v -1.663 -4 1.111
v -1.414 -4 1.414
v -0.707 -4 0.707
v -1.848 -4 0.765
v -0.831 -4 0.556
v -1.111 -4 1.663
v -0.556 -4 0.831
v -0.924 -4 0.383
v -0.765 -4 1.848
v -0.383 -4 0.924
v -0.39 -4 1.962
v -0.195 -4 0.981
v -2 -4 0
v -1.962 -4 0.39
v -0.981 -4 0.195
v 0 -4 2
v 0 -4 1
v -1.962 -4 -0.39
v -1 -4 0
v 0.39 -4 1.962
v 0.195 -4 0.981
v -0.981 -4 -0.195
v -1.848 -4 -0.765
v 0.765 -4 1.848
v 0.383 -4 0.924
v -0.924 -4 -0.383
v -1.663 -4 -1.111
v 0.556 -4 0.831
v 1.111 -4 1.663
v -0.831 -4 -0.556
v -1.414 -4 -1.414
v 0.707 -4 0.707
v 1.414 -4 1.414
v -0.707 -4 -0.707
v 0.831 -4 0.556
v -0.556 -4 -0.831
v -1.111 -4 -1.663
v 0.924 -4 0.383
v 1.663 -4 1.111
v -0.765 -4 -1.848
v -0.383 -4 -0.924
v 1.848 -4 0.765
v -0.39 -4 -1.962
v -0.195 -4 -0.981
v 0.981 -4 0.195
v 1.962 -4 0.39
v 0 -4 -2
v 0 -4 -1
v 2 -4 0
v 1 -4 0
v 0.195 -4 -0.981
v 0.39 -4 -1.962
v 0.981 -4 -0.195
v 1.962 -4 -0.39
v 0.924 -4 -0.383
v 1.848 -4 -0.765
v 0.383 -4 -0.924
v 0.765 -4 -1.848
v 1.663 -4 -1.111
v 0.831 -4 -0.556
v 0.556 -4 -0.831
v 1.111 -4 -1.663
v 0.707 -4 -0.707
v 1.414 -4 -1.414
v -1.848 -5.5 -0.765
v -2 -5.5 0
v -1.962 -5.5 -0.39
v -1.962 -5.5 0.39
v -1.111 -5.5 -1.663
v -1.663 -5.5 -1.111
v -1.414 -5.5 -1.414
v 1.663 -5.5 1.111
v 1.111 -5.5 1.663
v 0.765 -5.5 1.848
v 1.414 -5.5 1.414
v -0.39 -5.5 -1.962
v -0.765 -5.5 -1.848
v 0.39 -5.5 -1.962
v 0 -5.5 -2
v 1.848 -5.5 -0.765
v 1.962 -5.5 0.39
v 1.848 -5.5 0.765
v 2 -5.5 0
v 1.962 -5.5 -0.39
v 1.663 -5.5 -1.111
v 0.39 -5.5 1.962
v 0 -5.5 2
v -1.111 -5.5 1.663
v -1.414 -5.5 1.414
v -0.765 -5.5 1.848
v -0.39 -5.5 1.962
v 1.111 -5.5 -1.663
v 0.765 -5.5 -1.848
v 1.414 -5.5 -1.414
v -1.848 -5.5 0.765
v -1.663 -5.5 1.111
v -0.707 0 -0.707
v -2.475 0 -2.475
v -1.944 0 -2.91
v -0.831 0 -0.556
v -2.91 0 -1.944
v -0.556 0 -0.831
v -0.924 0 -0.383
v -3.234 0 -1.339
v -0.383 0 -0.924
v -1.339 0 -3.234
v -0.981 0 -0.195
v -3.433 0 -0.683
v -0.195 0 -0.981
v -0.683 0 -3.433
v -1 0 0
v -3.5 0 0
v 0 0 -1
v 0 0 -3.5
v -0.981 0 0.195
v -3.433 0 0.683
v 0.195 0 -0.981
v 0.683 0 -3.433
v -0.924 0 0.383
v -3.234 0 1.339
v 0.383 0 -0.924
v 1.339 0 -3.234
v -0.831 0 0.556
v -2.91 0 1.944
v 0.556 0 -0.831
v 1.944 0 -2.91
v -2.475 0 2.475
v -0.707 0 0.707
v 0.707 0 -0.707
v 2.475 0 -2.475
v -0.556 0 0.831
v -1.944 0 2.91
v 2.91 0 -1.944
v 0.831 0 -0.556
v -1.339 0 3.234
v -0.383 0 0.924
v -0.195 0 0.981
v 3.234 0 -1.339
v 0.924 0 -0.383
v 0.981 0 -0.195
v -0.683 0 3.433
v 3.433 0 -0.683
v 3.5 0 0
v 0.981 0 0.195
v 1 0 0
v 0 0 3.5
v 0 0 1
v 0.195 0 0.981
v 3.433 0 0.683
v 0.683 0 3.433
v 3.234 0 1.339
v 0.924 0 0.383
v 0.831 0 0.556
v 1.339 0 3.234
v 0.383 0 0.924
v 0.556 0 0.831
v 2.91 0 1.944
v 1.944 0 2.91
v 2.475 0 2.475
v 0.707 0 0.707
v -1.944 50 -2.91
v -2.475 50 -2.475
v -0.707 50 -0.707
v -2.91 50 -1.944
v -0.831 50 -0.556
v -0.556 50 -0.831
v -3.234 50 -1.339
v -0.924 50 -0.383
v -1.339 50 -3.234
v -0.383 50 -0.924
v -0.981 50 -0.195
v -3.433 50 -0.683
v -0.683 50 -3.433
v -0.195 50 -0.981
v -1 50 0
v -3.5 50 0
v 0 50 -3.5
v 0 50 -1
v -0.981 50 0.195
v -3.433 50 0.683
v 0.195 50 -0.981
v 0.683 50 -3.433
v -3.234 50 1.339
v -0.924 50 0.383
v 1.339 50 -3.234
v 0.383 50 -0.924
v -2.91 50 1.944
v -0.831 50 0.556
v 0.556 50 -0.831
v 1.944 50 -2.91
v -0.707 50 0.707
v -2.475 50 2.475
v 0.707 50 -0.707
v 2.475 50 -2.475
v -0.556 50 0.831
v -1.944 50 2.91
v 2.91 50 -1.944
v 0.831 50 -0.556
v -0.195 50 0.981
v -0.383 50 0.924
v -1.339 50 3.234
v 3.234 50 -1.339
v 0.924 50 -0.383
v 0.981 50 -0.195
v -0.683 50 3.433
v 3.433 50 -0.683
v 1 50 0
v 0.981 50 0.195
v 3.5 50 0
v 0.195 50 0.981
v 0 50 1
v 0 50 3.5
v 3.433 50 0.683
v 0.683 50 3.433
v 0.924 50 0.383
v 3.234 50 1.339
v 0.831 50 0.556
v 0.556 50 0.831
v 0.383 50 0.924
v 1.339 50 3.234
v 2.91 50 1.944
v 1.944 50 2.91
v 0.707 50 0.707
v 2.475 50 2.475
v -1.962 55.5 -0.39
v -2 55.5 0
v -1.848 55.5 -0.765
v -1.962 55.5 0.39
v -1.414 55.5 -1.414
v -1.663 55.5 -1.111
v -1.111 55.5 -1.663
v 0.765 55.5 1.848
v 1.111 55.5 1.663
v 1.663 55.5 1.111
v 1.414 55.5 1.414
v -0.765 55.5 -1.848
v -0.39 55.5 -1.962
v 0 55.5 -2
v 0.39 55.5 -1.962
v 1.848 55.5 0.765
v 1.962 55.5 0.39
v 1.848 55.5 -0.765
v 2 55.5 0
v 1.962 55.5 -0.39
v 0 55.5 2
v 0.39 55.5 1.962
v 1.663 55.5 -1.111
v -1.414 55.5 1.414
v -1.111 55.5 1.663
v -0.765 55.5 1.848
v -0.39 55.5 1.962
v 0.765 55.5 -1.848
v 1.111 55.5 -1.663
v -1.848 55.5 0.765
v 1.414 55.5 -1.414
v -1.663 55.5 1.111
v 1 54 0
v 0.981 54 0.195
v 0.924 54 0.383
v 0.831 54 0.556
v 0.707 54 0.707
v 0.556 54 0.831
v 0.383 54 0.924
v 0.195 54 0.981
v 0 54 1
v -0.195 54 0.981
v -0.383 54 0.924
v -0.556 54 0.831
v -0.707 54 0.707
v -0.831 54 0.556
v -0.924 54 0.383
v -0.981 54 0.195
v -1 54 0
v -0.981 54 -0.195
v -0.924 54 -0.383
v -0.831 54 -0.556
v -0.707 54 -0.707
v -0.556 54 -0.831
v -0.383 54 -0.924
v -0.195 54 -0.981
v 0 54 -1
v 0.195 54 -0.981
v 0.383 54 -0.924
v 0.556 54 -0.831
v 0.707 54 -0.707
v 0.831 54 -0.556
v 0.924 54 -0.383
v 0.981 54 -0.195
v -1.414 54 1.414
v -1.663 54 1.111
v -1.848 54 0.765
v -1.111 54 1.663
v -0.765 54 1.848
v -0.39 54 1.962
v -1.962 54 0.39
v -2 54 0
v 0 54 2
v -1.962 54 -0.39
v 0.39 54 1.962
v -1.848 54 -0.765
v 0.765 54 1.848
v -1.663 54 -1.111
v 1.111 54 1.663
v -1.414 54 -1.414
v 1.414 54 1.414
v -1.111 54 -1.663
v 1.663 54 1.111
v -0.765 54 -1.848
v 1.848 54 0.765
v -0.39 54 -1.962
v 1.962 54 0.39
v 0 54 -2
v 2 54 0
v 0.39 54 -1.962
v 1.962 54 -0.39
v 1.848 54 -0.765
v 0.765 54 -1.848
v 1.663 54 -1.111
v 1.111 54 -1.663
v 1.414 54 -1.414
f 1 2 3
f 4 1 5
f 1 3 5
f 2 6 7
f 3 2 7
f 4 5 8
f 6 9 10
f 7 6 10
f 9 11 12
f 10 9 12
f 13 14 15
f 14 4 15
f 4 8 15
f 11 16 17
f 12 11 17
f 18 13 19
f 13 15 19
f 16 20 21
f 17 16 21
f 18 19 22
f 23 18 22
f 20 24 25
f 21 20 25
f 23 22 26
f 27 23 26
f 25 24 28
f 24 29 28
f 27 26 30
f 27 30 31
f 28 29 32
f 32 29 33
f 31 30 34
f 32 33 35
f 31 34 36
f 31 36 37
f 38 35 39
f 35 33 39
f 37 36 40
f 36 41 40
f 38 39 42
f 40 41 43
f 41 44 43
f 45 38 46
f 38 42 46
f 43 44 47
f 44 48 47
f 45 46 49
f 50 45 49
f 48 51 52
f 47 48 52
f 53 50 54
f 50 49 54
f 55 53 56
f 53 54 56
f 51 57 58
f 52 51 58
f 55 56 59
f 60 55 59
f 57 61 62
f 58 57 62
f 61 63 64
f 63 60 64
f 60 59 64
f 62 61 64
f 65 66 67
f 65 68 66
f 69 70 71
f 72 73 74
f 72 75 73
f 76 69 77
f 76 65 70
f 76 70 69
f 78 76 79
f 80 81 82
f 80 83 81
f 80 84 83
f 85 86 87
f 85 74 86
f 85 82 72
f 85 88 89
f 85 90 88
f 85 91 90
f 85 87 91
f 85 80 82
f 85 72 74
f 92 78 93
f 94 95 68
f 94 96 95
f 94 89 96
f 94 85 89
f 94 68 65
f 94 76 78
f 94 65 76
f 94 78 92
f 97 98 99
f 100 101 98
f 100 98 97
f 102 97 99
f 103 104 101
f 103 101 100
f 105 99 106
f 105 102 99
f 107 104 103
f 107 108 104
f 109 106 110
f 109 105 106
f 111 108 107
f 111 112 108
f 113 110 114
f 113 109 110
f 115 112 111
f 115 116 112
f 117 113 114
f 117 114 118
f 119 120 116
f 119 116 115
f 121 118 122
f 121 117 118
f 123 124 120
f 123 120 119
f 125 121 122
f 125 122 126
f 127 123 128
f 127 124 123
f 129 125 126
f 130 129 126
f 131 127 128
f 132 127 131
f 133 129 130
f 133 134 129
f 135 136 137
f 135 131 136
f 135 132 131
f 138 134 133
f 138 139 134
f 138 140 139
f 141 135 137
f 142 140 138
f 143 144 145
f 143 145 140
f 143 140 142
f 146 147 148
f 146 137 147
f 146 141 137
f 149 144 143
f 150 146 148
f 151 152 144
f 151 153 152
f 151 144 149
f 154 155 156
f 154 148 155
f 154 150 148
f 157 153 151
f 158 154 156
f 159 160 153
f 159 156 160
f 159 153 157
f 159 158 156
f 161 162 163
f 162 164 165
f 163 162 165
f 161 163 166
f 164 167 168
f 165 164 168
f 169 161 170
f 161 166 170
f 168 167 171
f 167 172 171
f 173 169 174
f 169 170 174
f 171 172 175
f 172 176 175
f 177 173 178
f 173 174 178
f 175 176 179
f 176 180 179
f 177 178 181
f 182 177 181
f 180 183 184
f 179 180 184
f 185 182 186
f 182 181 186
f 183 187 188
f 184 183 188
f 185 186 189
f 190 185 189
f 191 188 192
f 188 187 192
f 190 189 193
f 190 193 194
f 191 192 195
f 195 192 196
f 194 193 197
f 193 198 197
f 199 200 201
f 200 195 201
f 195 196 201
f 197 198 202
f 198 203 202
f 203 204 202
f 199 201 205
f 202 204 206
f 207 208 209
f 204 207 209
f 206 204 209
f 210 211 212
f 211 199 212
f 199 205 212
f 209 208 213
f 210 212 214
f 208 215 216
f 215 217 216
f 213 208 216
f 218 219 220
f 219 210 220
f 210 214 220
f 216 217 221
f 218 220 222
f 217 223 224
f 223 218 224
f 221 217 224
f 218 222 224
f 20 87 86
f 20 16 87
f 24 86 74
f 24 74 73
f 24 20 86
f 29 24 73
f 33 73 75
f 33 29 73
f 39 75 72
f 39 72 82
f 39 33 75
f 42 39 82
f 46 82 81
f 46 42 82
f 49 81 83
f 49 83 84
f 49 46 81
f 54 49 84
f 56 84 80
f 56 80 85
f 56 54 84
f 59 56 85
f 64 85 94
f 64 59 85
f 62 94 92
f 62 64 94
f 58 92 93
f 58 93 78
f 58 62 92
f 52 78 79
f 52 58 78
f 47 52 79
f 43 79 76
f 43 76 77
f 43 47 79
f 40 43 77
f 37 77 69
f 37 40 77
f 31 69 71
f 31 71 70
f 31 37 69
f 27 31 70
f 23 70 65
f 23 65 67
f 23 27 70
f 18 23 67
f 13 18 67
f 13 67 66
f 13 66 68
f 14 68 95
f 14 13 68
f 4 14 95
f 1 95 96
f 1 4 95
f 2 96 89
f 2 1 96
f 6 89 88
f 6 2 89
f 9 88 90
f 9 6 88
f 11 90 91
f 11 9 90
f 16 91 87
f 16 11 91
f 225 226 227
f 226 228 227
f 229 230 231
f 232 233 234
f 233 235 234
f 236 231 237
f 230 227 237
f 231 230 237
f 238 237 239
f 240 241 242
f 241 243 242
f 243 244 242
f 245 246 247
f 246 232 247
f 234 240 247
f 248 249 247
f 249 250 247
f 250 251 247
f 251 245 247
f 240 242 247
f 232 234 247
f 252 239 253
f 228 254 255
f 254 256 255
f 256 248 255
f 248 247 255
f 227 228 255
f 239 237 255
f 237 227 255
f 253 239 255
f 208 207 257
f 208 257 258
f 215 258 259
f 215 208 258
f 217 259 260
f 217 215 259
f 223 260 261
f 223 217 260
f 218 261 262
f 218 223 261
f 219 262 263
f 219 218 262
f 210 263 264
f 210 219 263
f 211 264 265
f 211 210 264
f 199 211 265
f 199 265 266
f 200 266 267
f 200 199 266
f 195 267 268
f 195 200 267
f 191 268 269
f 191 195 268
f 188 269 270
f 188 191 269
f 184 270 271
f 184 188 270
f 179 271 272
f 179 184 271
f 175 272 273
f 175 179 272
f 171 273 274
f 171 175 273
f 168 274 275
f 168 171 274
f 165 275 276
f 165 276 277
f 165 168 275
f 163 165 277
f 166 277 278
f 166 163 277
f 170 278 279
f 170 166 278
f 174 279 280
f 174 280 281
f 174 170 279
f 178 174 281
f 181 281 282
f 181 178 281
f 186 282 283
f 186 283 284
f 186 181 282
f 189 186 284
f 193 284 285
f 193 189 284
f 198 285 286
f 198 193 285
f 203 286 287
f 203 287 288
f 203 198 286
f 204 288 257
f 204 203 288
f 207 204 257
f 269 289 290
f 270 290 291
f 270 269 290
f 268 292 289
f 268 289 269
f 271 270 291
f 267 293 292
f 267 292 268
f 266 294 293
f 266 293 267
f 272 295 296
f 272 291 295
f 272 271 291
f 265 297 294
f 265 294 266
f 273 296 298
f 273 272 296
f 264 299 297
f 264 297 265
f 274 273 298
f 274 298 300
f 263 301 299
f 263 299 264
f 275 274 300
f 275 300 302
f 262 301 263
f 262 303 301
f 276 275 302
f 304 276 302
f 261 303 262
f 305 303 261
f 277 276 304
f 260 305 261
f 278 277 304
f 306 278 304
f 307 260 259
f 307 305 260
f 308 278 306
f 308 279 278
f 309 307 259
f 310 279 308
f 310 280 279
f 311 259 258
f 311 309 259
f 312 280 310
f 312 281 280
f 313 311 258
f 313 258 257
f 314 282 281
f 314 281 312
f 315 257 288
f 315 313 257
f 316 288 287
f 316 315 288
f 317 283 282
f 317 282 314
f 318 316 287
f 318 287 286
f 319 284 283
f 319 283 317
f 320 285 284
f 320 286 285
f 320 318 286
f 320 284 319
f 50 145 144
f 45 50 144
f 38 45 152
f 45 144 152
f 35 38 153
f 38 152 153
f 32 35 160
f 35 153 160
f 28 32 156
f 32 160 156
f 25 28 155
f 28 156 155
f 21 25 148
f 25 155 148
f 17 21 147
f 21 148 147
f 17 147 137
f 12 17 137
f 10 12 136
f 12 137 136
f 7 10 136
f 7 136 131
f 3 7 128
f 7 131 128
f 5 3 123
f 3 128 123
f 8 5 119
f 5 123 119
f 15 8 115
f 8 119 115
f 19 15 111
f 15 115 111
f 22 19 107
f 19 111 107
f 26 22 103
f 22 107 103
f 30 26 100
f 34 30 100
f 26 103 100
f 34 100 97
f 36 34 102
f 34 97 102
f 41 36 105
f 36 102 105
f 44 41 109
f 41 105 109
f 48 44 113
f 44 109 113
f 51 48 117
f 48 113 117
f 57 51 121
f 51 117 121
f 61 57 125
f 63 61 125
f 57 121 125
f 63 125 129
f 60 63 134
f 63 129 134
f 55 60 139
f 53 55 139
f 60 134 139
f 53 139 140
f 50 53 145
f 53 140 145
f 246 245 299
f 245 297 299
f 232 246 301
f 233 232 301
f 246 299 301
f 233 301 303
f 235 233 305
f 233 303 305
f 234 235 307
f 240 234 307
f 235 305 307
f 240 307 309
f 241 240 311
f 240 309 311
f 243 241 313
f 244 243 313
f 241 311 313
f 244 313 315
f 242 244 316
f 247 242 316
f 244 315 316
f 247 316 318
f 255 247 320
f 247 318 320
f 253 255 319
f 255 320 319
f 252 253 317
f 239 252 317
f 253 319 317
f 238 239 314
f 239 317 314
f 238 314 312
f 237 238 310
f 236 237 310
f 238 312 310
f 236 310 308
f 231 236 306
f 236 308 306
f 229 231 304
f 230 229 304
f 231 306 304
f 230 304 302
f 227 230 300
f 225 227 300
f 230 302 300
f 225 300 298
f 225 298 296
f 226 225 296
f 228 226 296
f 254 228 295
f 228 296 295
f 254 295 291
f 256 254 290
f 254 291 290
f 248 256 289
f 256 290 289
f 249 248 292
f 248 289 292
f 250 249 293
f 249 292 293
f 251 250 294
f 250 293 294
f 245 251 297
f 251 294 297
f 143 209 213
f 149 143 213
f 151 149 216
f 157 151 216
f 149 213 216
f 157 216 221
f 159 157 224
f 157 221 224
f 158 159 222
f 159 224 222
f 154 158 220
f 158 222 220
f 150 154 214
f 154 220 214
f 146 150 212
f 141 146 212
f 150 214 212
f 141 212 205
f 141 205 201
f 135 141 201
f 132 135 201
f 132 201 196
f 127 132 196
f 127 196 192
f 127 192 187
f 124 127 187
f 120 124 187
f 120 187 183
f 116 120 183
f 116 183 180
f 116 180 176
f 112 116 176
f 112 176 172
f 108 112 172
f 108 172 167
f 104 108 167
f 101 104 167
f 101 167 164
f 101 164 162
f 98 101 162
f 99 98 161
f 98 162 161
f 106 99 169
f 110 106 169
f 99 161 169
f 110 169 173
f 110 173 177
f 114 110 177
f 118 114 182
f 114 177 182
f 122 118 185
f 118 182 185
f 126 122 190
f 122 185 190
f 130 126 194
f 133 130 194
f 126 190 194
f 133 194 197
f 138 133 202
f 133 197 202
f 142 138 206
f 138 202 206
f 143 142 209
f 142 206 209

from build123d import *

# Parameters (mm, degrees)
F0_R     = 3.5
F0_R_2   = 2
F0_R_3   = 1
F1_DEPTH = 25
F2_R     = 1
F3_DEPTH = 4
F4_W     = 1.5
F4_H     = 2


with BuildPart() as f1:
    # F0 (on Front) → F1 (new body)
    with BuildSketch(Plane.XZ):
        Circle(F0_R)
        Circle(F0_R_2, mode=Mode.SUBTRACT)
        Circle(F0_R_2)
        Circle(F0_R_3, mode=Mode.SUBTRACT)
        Circle(F0_R_3)
    extrude(amount=-F1_DEPTH)

    # F2 (on Front) → F3 (join)
    with BuildSketch(Plane.XZ):
        Circle(F2_R)
    extrude(amount=F3_DEPTH)

    # F4 (on Right) → F5 (revolve)
    with BuildSketch(Plane.YZ):
        with Locations((-4.75, 1)):
            Rectangle(F4_W, F4_H)
    revolve(axis=Axis((0, -4.75, 0), (0, 1, 0)))

    # F6: F1 across face


with BuildPart() as f1_1:
    add(f1.part)
    add(f1.part.mirror(Plane(origin=(0, 25, 0), x_dir=(1, 0, 0), z_dir=(0, 1, 0))))


solid = f1_1.part
